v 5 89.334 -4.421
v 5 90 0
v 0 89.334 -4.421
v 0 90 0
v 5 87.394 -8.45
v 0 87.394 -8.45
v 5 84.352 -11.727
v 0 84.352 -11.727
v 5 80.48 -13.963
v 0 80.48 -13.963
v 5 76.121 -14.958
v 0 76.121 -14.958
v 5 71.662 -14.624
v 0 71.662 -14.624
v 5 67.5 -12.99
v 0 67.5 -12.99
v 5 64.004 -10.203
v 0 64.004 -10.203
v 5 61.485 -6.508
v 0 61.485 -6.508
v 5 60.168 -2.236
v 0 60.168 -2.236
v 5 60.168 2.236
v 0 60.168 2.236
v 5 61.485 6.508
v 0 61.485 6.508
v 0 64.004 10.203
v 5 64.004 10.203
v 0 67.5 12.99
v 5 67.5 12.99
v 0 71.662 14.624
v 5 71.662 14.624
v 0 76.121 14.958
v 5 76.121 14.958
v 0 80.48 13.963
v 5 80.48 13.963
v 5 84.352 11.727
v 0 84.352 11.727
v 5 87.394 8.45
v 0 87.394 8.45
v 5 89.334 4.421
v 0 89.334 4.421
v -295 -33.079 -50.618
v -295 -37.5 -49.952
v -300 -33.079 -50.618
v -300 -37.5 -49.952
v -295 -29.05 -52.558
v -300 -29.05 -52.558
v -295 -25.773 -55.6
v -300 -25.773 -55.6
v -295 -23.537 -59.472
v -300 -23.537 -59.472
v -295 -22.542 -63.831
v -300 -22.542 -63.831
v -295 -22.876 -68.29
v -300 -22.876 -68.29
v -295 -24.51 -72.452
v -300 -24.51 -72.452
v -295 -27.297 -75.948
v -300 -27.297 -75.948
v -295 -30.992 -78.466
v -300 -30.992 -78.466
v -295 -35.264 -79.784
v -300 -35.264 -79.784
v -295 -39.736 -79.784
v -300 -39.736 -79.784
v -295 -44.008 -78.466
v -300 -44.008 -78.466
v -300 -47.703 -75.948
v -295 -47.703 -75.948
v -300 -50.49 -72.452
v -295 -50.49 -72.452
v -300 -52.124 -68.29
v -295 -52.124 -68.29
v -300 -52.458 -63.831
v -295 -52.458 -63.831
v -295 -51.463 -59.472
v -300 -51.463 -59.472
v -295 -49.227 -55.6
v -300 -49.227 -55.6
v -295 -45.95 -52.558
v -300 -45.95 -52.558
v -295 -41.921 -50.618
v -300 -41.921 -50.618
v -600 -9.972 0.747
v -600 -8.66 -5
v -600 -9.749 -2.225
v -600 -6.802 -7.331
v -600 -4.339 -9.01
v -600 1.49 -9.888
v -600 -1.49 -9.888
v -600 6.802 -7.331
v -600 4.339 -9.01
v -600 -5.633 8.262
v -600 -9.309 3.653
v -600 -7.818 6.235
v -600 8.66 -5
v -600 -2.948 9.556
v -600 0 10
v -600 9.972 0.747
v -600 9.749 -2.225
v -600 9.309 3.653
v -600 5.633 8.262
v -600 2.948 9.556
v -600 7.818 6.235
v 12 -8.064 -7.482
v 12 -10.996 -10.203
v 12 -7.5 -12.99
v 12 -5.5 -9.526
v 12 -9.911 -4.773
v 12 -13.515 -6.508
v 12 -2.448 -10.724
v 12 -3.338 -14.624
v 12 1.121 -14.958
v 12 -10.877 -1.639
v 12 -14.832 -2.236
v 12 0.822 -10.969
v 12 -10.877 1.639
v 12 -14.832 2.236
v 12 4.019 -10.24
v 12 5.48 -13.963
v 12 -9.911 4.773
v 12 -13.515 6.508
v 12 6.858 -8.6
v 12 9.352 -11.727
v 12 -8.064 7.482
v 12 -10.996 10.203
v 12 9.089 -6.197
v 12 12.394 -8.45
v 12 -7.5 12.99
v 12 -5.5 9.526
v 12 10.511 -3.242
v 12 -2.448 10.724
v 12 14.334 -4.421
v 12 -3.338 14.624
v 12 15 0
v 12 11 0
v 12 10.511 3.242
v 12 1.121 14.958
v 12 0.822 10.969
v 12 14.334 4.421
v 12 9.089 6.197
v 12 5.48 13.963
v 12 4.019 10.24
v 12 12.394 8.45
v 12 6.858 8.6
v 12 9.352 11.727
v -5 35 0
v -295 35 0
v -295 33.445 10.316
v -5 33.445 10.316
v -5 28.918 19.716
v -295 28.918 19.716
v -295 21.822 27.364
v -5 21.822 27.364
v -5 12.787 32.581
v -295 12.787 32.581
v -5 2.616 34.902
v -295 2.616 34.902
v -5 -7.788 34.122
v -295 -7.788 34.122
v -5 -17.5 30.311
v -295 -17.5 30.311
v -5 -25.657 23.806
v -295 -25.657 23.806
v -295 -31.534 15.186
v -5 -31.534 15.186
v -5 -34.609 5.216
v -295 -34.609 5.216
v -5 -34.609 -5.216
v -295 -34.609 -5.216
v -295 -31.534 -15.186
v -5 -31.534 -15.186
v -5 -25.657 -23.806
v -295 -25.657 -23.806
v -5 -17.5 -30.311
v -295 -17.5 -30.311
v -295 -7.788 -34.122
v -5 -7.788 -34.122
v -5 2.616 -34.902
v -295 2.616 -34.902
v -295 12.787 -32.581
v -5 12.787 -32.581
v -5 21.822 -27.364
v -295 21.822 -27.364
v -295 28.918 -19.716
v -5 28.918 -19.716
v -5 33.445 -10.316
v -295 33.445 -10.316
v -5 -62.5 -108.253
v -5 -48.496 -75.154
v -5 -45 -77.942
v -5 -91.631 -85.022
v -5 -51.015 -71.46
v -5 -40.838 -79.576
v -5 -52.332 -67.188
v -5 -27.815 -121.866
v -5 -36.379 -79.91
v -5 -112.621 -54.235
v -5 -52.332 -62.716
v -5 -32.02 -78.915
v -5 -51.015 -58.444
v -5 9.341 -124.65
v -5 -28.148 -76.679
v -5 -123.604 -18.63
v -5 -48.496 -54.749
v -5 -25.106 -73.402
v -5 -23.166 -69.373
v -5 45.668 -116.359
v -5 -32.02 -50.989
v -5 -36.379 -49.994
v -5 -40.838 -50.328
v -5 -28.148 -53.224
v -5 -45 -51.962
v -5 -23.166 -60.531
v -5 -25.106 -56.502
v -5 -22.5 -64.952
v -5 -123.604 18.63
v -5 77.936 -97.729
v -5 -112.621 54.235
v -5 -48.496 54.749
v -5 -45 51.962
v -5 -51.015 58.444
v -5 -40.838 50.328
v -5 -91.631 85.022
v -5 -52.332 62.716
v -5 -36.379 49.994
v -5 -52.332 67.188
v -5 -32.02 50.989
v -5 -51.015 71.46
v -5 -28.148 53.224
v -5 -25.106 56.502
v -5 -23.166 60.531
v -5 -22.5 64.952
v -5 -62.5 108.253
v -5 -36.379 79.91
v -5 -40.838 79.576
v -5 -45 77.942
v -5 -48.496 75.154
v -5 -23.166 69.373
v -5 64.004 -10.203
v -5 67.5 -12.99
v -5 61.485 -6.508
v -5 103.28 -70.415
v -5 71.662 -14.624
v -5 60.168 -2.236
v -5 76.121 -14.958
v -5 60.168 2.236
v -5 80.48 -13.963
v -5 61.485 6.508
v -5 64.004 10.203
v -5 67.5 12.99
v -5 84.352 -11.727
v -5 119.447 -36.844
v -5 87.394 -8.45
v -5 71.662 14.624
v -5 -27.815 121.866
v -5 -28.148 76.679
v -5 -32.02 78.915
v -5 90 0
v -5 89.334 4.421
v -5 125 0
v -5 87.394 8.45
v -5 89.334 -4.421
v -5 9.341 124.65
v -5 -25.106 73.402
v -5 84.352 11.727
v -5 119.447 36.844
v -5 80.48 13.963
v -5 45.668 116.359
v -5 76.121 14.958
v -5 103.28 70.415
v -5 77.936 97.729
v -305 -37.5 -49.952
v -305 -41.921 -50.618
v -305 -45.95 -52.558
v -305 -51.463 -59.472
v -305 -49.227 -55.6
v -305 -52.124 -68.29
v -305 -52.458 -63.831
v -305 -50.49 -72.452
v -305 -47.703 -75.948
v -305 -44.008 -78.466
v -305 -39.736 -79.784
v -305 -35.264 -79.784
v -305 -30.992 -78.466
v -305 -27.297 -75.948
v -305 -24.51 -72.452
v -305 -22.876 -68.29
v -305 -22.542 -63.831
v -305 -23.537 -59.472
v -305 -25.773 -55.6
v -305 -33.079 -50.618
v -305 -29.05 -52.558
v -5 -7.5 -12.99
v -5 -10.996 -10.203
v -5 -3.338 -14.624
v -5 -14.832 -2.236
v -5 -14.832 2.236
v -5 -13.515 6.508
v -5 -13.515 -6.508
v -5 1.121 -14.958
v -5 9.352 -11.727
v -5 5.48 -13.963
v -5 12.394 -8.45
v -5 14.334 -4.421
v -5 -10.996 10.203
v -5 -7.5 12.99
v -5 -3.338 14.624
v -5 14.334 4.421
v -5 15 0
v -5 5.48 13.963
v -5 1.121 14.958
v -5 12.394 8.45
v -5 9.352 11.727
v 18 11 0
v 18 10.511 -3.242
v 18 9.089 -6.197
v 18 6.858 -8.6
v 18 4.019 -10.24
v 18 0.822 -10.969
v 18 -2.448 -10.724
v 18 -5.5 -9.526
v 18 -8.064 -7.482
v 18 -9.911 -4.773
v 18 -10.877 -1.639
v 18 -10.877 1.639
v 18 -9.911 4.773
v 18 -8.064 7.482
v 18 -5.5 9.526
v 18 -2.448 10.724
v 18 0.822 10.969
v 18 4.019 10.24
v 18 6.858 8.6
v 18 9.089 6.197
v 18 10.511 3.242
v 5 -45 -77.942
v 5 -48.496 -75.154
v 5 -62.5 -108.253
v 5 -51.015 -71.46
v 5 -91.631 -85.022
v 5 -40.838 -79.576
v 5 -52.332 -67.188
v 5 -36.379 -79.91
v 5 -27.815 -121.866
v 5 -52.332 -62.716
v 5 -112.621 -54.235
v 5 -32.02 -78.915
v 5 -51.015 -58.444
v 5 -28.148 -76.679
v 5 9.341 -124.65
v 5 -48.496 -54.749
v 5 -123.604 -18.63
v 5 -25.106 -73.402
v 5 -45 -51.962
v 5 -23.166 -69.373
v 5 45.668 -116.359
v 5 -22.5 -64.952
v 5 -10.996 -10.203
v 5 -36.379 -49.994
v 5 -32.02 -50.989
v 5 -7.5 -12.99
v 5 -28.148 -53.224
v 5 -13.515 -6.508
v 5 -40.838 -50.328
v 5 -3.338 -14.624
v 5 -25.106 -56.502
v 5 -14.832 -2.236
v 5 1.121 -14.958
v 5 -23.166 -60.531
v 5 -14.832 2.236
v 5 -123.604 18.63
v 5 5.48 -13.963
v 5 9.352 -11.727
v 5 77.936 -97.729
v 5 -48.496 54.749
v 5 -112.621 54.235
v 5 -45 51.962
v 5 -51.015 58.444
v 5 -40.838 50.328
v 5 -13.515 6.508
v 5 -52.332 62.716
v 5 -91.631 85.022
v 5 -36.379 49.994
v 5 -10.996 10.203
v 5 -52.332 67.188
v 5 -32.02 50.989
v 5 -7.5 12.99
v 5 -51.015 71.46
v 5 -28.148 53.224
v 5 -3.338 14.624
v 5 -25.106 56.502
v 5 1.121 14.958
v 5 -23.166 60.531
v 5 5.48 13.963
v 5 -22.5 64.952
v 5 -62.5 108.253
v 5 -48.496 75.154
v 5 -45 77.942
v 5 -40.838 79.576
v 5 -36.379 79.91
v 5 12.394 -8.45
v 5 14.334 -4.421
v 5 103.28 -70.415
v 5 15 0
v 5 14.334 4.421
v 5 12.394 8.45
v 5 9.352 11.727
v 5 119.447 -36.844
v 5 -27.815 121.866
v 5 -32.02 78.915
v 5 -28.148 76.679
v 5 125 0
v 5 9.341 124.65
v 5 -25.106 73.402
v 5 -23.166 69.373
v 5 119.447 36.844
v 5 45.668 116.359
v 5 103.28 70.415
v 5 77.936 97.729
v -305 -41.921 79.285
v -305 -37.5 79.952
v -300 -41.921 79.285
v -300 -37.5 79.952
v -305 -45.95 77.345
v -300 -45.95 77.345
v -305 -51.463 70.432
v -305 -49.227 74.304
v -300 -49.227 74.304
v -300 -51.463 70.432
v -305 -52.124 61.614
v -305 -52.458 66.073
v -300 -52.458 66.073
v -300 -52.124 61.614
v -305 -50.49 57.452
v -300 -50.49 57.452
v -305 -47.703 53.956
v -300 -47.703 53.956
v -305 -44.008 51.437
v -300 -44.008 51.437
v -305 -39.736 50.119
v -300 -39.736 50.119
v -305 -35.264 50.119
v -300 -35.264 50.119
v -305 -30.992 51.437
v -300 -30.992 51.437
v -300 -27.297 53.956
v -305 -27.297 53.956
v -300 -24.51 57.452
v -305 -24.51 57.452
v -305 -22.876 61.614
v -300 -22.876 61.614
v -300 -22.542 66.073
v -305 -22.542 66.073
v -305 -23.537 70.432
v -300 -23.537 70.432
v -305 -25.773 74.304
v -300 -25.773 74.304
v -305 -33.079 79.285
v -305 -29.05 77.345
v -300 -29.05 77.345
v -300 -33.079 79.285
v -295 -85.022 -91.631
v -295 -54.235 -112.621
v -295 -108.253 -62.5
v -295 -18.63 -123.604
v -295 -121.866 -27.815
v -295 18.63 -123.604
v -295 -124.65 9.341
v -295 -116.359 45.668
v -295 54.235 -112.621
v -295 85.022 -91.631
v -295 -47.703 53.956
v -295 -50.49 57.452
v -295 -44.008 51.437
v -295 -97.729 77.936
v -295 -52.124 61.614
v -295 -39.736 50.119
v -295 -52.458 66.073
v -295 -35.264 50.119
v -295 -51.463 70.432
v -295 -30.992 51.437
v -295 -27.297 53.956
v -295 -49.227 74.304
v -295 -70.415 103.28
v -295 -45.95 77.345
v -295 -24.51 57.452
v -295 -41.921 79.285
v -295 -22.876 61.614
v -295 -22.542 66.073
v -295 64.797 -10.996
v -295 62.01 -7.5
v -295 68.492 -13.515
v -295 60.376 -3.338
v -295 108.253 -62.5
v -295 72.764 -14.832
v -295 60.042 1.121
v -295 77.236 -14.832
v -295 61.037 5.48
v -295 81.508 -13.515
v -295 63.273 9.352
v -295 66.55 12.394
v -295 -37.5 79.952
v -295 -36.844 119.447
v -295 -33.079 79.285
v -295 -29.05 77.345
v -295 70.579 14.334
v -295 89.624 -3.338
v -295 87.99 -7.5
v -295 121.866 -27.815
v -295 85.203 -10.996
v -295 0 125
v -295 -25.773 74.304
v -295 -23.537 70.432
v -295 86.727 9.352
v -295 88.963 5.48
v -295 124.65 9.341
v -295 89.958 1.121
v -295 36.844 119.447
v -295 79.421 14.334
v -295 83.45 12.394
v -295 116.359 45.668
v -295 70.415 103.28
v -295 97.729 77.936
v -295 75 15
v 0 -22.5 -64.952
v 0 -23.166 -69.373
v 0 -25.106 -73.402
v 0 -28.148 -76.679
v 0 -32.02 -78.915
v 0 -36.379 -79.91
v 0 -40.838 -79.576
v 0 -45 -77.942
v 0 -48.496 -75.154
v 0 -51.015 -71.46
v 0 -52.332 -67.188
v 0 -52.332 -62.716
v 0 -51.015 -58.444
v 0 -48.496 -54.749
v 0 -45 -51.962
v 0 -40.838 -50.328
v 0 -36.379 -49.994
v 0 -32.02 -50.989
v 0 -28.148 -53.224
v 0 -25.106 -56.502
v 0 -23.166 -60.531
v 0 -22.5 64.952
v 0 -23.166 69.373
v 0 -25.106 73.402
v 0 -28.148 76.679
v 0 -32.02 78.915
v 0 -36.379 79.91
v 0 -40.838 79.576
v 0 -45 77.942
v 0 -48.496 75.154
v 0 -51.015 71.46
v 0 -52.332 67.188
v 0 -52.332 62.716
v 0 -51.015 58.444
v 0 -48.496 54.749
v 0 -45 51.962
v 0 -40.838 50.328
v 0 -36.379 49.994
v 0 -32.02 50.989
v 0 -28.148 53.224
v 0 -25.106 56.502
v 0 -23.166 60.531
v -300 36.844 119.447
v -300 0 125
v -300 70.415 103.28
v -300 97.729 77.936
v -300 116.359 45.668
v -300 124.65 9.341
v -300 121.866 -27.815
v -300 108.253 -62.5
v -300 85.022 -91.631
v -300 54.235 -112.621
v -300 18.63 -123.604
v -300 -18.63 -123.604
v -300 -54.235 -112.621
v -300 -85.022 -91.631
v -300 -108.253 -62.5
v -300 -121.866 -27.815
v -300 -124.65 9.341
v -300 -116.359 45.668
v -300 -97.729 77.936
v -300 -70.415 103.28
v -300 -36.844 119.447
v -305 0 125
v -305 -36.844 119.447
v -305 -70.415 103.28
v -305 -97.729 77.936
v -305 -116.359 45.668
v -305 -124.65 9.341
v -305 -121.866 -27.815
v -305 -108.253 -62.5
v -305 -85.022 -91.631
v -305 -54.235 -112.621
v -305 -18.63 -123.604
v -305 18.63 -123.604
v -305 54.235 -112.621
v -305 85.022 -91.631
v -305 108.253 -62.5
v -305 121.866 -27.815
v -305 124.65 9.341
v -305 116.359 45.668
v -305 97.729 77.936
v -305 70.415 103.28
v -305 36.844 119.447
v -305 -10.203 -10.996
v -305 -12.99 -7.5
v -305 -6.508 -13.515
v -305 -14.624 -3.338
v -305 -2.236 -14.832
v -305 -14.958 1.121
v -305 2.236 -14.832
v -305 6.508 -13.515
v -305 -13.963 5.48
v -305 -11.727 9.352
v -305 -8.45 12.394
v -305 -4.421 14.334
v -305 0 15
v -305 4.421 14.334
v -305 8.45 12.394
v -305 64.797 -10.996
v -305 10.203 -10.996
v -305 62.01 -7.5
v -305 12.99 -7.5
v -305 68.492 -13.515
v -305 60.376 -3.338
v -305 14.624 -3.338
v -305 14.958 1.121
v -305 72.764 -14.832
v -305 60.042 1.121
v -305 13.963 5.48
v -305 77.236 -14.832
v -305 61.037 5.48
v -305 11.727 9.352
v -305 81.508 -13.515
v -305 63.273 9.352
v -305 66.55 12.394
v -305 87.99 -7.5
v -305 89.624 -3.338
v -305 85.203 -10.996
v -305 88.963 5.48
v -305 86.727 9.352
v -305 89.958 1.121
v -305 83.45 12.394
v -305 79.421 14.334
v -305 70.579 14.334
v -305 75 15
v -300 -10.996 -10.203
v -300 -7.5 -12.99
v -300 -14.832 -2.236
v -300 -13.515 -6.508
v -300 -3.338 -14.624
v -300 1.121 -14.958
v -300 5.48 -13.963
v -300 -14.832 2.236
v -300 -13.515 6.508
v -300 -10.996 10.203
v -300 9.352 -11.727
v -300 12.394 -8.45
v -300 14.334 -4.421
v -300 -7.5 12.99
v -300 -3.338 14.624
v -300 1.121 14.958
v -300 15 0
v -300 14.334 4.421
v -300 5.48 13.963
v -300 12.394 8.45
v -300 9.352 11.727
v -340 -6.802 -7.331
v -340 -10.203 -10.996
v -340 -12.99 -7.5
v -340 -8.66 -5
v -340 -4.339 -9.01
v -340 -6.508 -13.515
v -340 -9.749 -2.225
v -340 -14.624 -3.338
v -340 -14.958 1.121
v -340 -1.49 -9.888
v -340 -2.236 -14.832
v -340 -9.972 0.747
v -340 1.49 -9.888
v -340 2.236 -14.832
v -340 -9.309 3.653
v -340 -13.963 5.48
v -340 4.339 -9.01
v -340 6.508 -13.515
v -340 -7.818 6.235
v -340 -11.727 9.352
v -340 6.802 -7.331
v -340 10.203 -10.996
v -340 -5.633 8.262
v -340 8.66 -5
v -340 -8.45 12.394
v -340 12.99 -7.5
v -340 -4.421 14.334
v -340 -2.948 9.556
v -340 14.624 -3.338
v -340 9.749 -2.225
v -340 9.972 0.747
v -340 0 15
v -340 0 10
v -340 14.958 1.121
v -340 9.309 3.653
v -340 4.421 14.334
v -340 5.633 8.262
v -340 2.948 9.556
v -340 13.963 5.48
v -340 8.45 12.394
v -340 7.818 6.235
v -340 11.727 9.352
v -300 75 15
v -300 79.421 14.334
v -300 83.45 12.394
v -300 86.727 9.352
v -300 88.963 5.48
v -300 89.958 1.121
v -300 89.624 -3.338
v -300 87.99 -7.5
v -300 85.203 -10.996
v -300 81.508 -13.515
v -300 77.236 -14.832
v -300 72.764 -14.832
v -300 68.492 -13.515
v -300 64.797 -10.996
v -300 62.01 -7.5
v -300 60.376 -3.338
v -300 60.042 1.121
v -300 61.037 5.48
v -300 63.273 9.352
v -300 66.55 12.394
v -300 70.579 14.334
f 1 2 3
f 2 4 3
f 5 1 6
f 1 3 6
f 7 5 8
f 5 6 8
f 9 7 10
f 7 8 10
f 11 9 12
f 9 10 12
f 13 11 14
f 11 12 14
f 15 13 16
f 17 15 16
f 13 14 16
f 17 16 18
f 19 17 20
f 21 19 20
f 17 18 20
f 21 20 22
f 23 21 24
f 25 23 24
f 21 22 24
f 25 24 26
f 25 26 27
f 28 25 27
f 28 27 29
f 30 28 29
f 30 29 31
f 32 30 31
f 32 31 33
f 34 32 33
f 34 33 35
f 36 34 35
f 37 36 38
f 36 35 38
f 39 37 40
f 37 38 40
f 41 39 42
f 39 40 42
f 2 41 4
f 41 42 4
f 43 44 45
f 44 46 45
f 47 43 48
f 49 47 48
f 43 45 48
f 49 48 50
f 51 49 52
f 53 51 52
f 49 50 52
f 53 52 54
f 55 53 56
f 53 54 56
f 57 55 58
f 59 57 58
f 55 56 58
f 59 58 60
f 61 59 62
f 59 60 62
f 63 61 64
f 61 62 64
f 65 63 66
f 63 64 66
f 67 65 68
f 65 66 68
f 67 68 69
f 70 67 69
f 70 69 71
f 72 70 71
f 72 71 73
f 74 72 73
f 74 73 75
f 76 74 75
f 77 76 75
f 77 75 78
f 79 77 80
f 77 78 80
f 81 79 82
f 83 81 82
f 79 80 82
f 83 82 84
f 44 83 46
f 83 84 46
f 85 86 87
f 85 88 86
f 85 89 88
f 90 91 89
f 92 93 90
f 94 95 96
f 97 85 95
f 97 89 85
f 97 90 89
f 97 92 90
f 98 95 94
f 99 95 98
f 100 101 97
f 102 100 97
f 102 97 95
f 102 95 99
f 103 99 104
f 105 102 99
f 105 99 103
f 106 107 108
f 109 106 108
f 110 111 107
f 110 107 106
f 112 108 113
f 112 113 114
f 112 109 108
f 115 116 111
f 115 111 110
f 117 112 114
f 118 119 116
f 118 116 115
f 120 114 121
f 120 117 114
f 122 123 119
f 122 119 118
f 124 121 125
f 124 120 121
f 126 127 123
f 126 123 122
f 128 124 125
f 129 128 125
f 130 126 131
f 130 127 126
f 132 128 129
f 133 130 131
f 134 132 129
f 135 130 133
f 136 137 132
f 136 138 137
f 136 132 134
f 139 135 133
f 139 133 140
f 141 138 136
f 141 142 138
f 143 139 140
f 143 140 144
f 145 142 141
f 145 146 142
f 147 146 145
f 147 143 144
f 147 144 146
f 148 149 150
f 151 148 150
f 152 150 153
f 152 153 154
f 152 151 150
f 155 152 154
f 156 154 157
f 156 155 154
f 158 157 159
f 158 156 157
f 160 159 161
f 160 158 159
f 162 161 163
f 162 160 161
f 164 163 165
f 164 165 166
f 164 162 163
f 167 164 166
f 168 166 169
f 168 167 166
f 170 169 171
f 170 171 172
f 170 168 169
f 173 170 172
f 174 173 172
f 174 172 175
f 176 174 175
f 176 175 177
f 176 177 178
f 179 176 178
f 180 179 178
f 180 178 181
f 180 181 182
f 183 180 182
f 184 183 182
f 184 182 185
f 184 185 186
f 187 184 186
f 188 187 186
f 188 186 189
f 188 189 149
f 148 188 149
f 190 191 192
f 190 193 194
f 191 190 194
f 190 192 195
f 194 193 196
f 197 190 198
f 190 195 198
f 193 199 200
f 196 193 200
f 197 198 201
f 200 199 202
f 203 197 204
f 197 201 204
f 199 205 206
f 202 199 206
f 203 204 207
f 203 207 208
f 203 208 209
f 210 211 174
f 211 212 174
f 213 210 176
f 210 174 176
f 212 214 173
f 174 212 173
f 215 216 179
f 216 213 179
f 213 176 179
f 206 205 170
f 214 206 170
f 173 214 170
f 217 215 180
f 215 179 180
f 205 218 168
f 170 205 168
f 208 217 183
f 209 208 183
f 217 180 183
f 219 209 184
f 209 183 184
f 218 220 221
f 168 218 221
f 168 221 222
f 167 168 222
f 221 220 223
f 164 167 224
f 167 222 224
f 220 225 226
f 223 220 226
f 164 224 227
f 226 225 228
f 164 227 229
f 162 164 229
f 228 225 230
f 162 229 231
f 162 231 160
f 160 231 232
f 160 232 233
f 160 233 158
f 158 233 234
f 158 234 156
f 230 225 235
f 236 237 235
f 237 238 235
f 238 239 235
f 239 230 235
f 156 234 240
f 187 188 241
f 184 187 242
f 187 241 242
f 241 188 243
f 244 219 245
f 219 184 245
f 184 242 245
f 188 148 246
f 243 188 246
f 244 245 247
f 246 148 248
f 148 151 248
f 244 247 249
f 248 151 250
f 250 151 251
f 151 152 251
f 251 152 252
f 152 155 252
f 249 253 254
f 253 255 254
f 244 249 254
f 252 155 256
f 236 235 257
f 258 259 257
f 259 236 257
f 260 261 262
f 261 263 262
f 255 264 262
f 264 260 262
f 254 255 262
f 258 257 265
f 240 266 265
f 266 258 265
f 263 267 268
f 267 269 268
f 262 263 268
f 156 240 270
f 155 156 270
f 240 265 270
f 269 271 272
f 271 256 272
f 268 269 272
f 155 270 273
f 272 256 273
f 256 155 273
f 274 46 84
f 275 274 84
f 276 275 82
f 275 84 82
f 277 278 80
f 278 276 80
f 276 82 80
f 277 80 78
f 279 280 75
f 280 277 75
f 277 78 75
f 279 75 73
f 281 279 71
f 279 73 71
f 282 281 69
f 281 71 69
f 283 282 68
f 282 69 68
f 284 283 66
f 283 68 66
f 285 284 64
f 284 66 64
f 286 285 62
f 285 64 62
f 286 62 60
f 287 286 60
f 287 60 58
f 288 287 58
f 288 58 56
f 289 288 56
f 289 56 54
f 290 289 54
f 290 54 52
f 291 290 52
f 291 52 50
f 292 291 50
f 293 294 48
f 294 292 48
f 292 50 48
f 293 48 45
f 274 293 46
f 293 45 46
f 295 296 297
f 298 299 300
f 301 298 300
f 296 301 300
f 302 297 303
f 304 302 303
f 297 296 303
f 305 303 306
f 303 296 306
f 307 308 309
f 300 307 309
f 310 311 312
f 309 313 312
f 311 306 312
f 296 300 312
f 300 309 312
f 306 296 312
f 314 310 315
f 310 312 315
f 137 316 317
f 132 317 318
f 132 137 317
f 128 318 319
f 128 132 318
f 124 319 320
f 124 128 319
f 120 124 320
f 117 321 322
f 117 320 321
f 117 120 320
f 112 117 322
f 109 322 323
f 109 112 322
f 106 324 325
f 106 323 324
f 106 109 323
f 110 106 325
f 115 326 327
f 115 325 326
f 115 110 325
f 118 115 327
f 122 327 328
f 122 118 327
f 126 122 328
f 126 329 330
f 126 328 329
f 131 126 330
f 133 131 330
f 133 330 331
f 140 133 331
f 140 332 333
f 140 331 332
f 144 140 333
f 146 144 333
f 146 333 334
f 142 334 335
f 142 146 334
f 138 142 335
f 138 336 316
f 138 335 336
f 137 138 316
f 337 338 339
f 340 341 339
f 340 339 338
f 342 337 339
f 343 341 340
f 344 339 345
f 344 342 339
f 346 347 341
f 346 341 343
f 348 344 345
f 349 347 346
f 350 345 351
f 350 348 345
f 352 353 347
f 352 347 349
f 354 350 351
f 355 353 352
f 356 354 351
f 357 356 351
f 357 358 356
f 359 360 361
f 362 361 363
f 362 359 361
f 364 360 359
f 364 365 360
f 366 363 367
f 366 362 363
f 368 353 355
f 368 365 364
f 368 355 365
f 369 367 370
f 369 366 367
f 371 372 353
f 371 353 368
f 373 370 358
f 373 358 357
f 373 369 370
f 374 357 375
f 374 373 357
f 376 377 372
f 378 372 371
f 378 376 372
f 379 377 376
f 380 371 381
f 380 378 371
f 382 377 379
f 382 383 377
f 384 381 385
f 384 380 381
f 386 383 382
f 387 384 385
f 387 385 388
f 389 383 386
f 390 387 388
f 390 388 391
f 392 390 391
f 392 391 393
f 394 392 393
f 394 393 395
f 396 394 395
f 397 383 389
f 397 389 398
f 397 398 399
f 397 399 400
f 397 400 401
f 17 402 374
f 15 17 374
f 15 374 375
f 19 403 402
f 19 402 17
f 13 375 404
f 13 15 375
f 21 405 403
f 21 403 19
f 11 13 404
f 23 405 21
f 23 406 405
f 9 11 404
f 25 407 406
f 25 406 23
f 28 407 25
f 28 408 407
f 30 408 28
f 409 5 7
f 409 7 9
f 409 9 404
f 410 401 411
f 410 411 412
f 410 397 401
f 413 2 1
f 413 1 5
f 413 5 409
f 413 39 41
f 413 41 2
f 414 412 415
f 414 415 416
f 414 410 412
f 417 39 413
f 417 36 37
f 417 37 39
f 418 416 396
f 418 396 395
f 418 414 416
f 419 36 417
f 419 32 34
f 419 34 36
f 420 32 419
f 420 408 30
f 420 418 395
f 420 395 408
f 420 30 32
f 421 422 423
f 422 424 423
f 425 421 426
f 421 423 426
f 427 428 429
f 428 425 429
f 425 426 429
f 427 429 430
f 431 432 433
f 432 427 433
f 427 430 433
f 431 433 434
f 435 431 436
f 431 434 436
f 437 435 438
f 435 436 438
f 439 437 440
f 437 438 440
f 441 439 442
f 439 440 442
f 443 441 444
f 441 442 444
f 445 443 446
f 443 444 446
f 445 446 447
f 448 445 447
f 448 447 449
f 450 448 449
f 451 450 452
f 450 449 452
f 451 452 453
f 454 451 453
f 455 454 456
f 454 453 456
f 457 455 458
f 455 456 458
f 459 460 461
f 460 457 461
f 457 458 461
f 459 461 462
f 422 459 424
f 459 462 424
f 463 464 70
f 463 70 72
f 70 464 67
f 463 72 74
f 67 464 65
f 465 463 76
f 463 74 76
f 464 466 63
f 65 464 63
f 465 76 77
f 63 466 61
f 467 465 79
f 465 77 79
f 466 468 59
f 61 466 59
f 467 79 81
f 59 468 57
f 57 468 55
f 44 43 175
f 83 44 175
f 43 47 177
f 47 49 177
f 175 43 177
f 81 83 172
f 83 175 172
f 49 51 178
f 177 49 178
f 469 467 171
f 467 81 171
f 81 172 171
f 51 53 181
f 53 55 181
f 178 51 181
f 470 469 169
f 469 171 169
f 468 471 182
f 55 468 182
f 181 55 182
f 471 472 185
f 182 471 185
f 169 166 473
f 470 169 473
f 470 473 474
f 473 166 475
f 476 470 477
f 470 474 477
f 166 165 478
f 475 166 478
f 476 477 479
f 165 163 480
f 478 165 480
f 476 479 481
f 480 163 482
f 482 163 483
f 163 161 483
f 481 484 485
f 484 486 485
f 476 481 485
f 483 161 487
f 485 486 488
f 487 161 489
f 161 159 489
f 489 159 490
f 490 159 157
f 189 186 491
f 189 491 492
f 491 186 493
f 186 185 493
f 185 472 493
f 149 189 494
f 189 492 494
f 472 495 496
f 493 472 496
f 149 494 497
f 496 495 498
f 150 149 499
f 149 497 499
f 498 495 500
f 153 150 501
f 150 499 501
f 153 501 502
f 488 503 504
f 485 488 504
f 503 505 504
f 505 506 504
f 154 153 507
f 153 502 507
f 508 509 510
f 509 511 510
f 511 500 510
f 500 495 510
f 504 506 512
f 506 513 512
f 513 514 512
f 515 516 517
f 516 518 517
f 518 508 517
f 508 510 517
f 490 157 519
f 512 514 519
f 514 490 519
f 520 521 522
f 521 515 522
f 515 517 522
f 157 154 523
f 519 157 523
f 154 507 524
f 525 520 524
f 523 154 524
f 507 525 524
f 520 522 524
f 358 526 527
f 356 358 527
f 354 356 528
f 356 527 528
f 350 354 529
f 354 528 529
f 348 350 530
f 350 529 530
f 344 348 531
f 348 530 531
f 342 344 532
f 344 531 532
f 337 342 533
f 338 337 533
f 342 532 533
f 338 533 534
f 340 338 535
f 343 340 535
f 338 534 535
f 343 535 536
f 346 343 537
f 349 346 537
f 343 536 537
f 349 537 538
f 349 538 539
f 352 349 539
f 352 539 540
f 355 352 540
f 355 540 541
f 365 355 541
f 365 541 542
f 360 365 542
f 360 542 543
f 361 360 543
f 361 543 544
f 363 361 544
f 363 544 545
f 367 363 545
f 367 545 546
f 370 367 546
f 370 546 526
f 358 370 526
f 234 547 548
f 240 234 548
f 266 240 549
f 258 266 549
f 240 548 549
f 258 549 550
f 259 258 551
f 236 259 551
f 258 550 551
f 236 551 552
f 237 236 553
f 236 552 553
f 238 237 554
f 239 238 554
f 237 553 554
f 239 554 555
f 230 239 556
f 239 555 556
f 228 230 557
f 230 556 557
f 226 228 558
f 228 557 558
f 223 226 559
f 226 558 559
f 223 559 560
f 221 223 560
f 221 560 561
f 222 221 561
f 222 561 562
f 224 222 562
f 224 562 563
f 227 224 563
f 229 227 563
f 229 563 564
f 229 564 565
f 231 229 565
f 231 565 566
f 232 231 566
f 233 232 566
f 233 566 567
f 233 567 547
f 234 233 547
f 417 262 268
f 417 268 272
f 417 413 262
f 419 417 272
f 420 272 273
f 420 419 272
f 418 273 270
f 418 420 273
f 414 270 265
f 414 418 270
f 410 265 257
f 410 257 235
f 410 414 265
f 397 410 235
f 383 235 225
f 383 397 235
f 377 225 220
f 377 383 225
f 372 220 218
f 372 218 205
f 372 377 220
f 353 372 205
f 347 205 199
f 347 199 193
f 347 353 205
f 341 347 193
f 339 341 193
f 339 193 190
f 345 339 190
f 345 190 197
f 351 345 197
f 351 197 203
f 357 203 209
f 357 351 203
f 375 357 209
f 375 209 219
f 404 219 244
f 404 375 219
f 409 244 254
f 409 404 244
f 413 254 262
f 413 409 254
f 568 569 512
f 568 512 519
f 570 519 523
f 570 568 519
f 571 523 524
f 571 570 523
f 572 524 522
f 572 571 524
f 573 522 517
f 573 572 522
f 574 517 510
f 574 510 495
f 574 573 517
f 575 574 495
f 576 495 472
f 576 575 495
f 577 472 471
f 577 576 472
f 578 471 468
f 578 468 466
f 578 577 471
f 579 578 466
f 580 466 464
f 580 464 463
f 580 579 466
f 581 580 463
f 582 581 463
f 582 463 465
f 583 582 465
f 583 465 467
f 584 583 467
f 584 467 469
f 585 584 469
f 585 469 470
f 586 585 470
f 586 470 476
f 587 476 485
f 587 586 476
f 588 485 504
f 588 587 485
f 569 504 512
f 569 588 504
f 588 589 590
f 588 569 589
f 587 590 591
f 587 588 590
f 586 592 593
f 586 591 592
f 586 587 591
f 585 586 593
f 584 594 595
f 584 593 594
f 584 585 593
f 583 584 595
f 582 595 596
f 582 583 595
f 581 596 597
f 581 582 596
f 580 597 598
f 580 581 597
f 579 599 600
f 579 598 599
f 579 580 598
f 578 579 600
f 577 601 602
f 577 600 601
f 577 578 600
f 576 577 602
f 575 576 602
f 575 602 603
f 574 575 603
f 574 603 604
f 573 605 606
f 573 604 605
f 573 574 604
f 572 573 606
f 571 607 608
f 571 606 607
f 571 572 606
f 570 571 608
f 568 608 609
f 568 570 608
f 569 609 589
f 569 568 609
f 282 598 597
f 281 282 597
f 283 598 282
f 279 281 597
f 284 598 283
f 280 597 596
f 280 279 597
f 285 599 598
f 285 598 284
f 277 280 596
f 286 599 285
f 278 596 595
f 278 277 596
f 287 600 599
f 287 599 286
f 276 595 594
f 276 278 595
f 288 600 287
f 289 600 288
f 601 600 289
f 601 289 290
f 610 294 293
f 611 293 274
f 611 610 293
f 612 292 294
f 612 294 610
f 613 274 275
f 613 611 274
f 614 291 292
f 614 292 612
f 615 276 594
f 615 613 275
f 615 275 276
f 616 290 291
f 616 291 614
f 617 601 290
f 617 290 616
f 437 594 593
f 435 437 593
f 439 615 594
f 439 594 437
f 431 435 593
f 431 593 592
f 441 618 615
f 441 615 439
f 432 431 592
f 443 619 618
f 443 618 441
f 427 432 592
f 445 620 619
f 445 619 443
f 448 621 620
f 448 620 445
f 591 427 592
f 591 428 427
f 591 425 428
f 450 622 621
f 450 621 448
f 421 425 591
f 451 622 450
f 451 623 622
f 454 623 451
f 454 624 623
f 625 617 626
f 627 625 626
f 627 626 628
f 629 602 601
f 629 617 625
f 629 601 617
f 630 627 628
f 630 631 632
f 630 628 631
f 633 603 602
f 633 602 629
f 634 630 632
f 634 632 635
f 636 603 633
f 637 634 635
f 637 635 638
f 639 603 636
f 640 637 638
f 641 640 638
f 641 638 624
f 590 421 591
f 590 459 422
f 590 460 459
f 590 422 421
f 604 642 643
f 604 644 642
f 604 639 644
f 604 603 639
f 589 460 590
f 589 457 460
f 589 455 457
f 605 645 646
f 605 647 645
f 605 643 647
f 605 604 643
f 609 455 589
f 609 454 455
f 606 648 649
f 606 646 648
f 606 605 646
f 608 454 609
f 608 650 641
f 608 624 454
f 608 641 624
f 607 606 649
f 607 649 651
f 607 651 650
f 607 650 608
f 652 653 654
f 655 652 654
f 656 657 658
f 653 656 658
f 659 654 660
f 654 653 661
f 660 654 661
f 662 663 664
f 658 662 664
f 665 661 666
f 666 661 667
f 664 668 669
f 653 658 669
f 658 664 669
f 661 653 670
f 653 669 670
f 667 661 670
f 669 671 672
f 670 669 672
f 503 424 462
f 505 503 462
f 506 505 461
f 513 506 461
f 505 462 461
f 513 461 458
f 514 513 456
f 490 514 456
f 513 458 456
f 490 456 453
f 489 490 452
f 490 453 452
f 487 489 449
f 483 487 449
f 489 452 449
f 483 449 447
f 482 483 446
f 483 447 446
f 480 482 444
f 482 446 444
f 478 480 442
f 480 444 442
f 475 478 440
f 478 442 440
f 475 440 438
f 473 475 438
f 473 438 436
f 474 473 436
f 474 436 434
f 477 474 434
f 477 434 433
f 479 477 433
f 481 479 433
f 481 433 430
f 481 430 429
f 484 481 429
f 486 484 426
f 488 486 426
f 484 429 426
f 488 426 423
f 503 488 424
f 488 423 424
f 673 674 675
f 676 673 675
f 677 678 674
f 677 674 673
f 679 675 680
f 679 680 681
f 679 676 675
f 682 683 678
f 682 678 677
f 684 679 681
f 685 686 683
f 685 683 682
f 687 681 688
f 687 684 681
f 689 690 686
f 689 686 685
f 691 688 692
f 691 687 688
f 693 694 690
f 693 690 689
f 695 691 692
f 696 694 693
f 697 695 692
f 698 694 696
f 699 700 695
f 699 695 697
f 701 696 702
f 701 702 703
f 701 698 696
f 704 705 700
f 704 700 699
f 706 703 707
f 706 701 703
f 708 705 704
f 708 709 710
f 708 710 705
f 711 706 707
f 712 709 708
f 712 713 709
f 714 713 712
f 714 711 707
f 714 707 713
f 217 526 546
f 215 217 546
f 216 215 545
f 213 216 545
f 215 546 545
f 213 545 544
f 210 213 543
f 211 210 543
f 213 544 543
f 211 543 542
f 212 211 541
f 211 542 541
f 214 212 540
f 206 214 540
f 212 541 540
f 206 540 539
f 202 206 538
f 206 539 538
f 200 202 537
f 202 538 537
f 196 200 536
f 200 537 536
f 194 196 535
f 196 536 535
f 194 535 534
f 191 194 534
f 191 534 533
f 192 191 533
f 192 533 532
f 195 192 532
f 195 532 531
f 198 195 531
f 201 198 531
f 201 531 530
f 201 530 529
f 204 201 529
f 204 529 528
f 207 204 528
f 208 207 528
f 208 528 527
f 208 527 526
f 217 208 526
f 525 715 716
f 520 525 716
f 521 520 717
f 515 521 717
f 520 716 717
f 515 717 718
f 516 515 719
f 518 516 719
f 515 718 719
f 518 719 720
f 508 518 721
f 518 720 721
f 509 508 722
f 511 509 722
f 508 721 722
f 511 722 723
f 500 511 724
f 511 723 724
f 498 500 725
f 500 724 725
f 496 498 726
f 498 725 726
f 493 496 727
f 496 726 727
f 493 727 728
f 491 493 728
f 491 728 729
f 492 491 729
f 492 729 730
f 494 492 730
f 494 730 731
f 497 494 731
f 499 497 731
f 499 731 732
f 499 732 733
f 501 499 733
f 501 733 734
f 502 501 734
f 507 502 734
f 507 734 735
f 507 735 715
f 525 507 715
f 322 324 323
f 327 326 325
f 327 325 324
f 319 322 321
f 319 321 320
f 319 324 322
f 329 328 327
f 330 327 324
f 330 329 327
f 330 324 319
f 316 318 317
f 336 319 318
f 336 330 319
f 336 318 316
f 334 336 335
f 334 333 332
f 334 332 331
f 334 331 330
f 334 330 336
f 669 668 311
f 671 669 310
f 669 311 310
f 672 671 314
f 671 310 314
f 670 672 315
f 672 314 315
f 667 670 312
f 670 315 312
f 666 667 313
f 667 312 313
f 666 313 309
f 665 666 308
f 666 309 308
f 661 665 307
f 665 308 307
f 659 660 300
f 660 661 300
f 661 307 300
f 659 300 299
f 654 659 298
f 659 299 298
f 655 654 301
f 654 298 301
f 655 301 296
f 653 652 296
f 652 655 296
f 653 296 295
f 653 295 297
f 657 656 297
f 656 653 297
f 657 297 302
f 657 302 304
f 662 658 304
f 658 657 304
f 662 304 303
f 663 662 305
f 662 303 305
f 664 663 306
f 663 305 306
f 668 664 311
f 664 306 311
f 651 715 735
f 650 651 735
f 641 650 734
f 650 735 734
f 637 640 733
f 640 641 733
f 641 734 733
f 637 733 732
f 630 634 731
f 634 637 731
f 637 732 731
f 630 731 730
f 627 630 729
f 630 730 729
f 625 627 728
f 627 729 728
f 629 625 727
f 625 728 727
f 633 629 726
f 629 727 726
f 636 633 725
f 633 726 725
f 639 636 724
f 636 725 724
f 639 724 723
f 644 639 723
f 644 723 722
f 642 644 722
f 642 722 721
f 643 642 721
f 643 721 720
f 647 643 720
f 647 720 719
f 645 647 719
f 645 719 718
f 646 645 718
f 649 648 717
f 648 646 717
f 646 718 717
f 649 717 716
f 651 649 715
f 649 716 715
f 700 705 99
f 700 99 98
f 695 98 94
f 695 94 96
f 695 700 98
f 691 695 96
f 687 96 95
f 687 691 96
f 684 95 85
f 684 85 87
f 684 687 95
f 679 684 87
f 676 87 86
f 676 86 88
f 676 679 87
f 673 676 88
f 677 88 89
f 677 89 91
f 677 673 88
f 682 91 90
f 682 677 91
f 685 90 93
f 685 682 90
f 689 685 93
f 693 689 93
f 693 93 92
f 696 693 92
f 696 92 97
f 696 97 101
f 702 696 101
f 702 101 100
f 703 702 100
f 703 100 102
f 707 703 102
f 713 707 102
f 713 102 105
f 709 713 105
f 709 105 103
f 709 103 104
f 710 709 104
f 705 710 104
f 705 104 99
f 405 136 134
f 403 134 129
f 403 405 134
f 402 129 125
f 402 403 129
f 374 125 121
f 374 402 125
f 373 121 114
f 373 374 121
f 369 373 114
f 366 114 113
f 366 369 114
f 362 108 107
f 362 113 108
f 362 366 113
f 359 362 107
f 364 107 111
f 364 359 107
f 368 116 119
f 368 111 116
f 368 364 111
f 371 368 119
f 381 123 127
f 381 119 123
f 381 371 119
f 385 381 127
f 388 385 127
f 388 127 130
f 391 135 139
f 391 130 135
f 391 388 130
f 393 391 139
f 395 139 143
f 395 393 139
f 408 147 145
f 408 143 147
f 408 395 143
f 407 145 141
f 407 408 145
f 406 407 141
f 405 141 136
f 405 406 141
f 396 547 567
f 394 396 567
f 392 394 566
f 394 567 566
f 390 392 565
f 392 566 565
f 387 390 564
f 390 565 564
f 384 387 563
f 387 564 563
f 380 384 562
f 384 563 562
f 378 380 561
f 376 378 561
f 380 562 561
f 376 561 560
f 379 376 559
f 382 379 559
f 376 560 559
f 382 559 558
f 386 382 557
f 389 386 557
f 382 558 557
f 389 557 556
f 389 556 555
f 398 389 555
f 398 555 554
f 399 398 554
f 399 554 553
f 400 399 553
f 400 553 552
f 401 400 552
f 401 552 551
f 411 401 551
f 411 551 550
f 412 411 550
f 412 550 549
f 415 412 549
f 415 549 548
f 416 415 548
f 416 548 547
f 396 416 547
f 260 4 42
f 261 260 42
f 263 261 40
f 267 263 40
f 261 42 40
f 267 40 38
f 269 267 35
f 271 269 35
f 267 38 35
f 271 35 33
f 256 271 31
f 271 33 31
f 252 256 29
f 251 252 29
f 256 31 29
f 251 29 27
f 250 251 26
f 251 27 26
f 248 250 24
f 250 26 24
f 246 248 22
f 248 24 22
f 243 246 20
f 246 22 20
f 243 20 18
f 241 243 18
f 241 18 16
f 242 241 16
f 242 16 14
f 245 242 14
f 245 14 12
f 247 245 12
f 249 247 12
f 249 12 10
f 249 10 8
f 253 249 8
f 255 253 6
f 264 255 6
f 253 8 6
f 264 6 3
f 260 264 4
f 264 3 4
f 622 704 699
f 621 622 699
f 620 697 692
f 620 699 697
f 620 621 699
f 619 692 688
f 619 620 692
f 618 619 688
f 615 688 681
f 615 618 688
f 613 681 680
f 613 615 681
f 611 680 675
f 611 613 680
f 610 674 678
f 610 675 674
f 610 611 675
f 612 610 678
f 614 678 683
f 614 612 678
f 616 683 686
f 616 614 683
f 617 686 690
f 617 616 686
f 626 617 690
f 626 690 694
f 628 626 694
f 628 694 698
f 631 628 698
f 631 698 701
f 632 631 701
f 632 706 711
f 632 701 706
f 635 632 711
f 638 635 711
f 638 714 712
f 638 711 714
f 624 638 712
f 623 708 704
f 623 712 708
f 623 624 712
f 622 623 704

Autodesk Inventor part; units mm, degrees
ref_plane "YZ Plane" through (0, 0, 0) normal (1, 0, 0) x (0, 1, 0)
ref_plane "XZ Plane" through (0, 0, 0) normal (0, 1, 0) x (-1, 0, 0)
ref_plane "XY Plane" through (0, 0, 0) normal (0, 0, 1) x (1, 0, 0)
sketch "Sketch1" plane through (0, 0, 0) normal (1, 0, 0) x (0, 1, 0)
  circle A0 centre (0, 0) radius 35
  circle A1 centre (0, 0) radius 125
  circle A2 centre (0, 0) radius 10 construction
  line L0 (-8.55, -5.1863) -> (-8.7665, 4.8113)
  line L1 (-8.7665, 4.8113) -> (-0.2165, 9.9977)
  line L2 (-0.2165, 9.9977) -> (8.55, 5.1863)
  line L3 (8.55, 5.1863) -> (8.7665, -4.8113)
  line L4 (8.7665, -4.8113) -> (0.2165, -9.9977)
  line L5 (0.2165, -9.9977) -> (-8.55, -5.1863)
  circle A3 centre (0, 0) radius 15
  circle A4 centre (0, 0) radius 75 construction
  circle A5 centre (75, 0) radius 15
  circle A6 centre (-37.5, 64.9519) radius 15
  circle A7 centre (-37.5, -64.9519) radius 15
  circle A8 centre (0, 0) radius 11
  dimension "d2" = 20
  dimension "d12" = 150
  dimension "d0" = 70
  dimension "d1" = 250
  dimension "d3" = 30
  dimension "d13" = 30
  dimension "d16" = 360
  dimension "d20" = 22
extrude "Extrusion1" add sketch "Sketch1" along normal mid plane 10 contours A0 | A1 | L0 L1 L2 L3 L4 L5 | A3 | A5 | A6 | A7 | A8
extrude "Extrusion2" add sketch "Sketch1" against normal blind 300 contours A0
extrude "Extrusion3" add sketch "Sketch1" along normal blind 15 contours L0 L1 L2 L3 L4 L5
extrude "Extrusion4" add sketch "Sketch1" along normal blind 12 contours A3 | A8
extrude "Extrusion5" cut sketch "Sketch1" along normal through all both and the other way through all contours A5 | A6 | A7
extrude "Extrusion6" add sketch "Sketch1" along normal blind 18 contours L0 L1 L2 L3 L4 L5 | A8
sketch "Sketch2" plane through (-300, 0, 0) normal (-1, 0, 0) x (0, 0, 1)
  circle A0 centre (0, 0) radius 125 projected
  circle A1 centre (0, 75) radius 15 projected
  circle A2 centre (-64.9519, -37.5) radius 15 projected
  circle A3 centre (64.9519, -37.5) radius 15 projected
  circle A4 centre (0, 0) radius 15 projected
  circle A5 centre (0, 0) radius 10 projected
  line L0 (4.8113, -8.7665) -> (-5.1863, -8.55) projected
  line L1 (-5.1863, -8.55) -> (-9.9977, 0.2165) projected
  line L2 (-9.9977, 0.2165) -> (-4.8113, 8.7665) projected
  line L3 (-4.8113, 8.7665) -> (5.1863, 8.55) projected
  line L4 (5.1863, 8.55) -> (9.9977, -0.2165) projected
  line L5 (9.9977, -0.2165) -> (4.8113, -8.7665) projected
extrude "Extrusion7" add sketch "Sketch2" along normal mid plane 10 contours A0
extrude "Extrusion8" add sketch "Sketch2" along normal blind 300 contours A5 L4 | L3 A5 | L4 L5 L0 L1 L2 L3 | A5 L5 | L2 A5 | A5 L0 | L1 A5
extrude "Extrusion10" add sketch "Sketch2" along normal blind 40 contours A4 | A5 L4 | L3 A5 | L4 L5 L0 L1 L2 L3 | A5 L5 | L2 A5 | A5 L0 | L1 A5
properties part number "roller"
